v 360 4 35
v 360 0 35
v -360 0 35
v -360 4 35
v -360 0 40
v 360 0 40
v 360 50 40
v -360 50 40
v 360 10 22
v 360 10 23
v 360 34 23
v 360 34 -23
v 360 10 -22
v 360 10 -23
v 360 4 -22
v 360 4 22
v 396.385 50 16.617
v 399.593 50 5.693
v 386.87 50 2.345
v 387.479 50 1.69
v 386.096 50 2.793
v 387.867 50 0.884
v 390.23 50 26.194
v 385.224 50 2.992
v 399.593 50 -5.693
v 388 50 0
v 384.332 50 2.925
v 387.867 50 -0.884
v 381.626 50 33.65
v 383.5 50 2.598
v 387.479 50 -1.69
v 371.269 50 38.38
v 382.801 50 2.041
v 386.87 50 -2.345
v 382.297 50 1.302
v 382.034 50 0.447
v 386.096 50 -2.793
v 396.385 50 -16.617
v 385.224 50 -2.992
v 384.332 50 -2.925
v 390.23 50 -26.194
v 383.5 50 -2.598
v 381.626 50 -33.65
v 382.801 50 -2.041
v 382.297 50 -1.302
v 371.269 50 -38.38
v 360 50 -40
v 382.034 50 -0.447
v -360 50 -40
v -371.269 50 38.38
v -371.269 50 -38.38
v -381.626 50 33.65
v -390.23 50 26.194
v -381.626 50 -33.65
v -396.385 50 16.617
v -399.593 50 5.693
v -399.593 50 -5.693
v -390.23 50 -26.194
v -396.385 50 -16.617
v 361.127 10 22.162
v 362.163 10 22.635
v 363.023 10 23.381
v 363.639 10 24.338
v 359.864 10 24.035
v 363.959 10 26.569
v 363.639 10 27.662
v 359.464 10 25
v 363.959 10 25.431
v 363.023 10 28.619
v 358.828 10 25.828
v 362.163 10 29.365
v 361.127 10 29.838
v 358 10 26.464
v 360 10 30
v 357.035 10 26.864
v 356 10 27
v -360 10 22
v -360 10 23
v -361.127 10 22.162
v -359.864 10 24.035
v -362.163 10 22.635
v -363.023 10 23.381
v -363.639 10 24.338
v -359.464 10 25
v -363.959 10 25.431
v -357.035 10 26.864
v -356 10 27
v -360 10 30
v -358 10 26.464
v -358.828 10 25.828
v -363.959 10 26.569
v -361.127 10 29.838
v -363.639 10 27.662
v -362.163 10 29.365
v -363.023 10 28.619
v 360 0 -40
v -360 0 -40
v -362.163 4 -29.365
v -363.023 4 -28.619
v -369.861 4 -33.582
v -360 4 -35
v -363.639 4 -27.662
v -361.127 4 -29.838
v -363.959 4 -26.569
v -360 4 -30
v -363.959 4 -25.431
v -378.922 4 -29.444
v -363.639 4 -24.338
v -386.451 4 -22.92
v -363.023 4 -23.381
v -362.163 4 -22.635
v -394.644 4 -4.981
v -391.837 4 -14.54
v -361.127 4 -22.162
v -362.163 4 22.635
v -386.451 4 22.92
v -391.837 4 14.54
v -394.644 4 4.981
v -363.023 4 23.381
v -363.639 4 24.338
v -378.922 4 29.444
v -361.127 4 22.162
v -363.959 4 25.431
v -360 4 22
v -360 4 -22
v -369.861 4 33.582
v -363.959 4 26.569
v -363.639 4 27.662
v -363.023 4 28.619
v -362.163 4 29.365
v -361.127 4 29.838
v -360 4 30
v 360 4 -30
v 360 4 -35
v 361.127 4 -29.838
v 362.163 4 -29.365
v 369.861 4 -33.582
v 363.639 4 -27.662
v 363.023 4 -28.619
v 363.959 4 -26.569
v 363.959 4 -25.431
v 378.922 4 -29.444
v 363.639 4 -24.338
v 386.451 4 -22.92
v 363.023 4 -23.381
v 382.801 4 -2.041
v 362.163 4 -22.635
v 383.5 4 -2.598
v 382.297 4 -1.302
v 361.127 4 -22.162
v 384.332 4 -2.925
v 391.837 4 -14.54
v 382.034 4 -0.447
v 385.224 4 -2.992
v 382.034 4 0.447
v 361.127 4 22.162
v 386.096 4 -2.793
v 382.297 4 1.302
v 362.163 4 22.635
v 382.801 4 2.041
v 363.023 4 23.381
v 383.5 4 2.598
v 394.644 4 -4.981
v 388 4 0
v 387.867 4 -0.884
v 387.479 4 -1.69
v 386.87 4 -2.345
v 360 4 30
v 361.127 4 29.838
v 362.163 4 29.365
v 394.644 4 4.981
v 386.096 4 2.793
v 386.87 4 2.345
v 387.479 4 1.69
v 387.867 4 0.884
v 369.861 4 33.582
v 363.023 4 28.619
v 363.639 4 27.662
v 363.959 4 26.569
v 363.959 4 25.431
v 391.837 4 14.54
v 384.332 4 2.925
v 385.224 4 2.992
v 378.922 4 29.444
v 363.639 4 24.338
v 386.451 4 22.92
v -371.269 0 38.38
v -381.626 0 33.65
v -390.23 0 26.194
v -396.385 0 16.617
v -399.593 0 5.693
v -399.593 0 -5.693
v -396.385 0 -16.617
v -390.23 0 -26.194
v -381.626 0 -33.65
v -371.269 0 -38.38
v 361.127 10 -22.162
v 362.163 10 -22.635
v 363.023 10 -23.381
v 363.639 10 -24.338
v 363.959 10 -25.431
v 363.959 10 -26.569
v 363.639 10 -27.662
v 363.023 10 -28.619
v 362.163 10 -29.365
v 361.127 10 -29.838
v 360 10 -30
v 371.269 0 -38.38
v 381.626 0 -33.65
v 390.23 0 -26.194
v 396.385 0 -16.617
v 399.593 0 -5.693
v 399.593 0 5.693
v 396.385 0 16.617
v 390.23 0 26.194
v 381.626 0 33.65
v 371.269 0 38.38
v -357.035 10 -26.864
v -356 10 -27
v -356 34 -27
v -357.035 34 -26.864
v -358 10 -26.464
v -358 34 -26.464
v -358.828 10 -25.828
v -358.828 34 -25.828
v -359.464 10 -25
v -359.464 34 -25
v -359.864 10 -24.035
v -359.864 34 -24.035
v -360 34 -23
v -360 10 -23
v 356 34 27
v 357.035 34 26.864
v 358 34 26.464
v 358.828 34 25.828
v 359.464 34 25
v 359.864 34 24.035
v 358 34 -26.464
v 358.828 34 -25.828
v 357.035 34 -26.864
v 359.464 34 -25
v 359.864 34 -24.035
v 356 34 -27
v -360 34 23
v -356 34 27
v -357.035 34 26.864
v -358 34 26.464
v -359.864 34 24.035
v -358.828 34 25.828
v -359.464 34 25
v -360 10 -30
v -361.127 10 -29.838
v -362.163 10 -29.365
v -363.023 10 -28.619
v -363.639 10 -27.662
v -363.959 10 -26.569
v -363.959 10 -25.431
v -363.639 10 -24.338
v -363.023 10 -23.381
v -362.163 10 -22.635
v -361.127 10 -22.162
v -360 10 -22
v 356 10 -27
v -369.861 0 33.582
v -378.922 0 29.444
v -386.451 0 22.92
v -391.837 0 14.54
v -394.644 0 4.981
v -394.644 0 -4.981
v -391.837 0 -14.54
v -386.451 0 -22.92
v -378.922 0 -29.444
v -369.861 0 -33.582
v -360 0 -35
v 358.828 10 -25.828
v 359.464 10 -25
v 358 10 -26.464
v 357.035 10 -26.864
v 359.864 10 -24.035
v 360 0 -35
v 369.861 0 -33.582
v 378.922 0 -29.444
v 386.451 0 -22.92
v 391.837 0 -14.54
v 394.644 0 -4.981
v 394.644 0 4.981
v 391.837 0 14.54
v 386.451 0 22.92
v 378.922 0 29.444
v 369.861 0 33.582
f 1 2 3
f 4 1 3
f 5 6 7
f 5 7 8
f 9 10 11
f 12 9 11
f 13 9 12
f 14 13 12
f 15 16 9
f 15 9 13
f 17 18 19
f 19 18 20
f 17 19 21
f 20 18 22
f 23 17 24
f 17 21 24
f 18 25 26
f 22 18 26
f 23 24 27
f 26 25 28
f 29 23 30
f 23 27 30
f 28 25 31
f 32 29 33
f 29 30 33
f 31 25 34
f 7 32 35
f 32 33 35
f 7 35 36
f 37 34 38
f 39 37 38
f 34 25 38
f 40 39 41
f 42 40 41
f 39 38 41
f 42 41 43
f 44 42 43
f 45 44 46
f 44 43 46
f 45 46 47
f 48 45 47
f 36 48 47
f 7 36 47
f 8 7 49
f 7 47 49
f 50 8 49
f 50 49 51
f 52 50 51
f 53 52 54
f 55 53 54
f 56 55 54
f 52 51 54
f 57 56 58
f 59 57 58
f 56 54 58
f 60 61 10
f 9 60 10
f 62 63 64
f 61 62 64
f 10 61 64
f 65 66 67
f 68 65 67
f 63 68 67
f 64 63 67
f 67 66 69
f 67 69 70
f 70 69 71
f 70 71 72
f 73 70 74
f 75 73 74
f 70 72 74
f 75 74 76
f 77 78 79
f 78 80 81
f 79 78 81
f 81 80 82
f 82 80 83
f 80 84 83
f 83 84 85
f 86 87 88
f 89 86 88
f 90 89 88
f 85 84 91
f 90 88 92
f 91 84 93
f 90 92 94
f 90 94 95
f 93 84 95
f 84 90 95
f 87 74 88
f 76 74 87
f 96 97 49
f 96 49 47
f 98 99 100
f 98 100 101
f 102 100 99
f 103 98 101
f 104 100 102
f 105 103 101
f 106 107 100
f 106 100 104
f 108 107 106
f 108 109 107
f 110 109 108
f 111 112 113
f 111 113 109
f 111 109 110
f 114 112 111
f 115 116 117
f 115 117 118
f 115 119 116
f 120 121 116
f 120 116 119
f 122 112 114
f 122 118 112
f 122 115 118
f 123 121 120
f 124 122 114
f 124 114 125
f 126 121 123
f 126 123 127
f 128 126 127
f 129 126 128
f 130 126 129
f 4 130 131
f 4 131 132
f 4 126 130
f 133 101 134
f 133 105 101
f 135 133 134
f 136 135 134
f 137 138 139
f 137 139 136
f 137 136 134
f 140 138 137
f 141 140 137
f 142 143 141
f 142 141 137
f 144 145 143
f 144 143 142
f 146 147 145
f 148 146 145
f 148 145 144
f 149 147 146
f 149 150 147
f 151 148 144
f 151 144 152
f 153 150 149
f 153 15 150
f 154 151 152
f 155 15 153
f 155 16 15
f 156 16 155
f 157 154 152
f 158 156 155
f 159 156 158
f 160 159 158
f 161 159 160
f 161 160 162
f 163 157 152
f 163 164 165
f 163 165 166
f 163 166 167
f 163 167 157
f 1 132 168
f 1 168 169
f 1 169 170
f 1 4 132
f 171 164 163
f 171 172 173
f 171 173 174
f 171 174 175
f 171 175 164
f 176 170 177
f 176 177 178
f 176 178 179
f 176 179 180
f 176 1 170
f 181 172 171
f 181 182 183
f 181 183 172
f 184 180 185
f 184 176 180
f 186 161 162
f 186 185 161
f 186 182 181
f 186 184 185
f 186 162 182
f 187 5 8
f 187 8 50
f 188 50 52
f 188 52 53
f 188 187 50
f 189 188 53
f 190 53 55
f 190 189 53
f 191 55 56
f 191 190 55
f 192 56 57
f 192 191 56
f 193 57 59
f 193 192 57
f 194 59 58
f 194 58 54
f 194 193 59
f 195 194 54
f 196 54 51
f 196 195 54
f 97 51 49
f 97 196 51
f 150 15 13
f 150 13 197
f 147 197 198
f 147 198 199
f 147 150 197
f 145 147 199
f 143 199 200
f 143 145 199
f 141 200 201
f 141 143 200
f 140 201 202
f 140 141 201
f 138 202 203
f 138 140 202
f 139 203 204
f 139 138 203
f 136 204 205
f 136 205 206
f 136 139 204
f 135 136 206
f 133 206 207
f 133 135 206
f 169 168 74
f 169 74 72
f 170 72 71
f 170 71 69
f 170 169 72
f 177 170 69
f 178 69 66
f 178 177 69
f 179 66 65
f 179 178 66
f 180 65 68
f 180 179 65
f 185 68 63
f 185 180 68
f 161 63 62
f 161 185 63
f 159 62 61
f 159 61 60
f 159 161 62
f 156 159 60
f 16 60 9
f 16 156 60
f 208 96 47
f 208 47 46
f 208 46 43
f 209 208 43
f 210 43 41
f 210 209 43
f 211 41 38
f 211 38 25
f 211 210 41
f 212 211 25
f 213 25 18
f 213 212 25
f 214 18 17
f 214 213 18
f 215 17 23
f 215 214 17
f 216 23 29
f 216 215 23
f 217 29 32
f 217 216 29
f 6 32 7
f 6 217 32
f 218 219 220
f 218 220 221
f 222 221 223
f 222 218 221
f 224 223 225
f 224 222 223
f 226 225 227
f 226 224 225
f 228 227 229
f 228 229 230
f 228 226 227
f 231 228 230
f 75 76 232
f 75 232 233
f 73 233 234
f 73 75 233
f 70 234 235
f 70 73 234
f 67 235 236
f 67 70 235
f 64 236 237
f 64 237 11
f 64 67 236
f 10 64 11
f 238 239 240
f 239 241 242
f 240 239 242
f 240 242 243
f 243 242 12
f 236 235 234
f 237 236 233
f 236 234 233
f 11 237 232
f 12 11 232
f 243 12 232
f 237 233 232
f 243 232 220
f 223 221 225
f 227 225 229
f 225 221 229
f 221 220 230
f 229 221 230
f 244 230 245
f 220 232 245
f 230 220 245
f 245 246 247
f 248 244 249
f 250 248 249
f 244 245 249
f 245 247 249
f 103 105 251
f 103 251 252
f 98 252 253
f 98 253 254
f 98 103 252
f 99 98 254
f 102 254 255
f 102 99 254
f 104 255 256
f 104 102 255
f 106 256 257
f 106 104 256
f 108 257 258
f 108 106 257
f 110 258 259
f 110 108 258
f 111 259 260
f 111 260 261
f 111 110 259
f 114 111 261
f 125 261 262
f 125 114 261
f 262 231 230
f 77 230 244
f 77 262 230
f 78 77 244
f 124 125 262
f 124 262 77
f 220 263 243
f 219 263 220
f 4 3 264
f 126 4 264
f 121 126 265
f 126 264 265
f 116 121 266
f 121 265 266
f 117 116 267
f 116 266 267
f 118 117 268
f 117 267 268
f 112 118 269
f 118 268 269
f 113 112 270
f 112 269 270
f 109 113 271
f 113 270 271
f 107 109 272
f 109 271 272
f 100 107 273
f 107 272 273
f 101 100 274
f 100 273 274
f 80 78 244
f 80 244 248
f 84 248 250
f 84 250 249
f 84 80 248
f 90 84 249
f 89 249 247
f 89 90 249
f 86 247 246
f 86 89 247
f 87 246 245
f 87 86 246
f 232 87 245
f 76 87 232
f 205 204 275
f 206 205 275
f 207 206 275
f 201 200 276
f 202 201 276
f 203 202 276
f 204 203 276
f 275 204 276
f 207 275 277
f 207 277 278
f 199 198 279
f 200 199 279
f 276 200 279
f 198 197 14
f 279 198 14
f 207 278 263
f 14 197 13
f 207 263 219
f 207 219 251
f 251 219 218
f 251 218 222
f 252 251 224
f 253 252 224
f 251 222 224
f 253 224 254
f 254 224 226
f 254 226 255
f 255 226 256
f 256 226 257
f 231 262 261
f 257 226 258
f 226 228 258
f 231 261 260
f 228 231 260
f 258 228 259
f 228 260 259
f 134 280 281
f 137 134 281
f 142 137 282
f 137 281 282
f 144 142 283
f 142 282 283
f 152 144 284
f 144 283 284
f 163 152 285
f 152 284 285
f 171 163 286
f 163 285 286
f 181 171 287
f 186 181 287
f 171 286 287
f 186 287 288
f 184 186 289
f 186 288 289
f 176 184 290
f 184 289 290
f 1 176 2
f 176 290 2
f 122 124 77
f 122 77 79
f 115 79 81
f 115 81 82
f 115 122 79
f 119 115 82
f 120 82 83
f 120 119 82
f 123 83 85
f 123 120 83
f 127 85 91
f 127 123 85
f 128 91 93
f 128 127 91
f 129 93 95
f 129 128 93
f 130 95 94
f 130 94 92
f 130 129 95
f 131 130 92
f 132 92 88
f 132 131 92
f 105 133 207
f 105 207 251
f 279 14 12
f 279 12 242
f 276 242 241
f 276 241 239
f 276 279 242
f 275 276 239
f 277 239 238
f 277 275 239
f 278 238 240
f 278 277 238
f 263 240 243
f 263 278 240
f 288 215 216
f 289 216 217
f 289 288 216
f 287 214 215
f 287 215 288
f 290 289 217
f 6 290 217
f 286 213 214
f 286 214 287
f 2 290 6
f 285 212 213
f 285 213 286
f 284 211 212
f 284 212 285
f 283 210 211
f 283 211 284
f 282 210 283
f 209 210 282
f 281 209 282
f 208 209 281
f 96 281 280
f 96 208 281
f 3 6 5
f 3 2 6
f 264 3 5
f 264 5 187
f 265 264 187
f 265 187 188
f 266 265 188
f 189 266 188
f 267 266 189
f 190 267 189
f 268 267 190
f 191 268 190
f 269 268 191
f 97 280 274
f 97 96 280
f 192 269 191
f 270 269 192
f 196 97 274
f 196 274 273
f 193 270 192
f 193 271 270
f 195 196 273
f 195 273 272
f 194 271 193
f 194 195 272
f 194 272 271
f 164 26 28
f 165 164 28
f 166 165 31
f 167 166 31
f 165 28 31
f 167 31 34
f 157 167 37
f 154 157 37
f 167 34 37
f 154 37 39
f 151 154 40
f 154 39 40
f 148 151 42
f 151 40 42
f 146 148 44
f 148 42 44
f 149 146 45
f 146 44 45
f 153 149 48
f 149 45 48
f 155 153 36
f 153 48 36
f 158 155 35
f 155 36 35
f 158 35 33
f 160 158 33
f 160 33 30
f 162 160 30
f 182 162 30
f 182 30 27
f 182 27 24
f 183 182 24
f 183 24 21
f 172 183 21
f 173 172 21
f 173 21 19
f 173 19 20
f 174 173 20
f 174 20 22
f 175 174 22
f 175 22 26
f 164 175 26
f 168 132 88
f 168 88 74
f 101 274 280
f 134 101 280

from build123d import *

# Parameters (mm, degrees)
BOSS_EXTRUDE1_DEPTH = 50
CUT_EXTRUDE2_DEPTH  = 4
CUT_EXTRUDE14_DEPTH = 6
CUT_EXTRUDE16_DEPTH = 30
HOLE1_D             = 6


with BuildPart() as part:
    # Sketch1 → Boss-Extrude1 (new body)
    with BuildSketch(Plane(origin=(0, 0, 0), x_dir=(1, 0, 0), z_dir=(0, 1, 0))):
        with BuildLine():
            Line((-360, 39.99999406), (360, 39.99999406))
            ThreePointArc((360, 39.99999406), (399.999998105, -4.045e-06), (360, -40))
            Line((360, -40), (-360, -40))
            ThreePointArc((-360, -40), (-399.99999406, -5.94e-06), (-360, 39.99999406))
        make_face()
    extrude(amount=BOSS_EXTRUDE1_DEPTH)

    # Sketch4 → Cut-Extrude2 (cut)
    with BuildSketch(Plane.XZ):
        with BuildLine():
            Line((360, 35.000001075), (-360, 35.000001485))
            ThreePointArc((-360, 35.000001485), (-394.999995545, 5.94e-06), (-360, -34.999989605))
            Line((-360, -34.999989605), (360.000000021, -34.99999406))
            ThreePointArc((360.000000021, -34.99999406), (394.999998105, 4.055e-06), (360, 35.000001075))
        make_face()
    extrude(amount=-CUT_EXTRUDE2_DEPTH, mode=Mode.SUBTRACT)

    # Sketch15 → Cut-Extrude14 (cut)
    with BuildSketch(Plane.XZ.offset(-4)):
        with BuildLine():
            Line((360, -30), (-360, -30))
            ThreePointArc((-360, -30), (-364, -26), (-360, -22))
            Line((-360, -22), (-360, 22))
            ThreePointArc((-360, 22), (-364, 26), (-360, 30))
            Line((-360, 30), (360, 30))
            ThreePointArc((360, 30), (364, 26), (360, 22))
            Line((360, 22), (360, -22))
            ThreePointArc((360, -22), (364, -26), (360, -30))
        make_face()
    extrude(amount=-CUT_EXTRUDE14_DEPTH, mode=Mode.SUBTRACT)

    # Sketch2 → Cut-Extrude16 (cut)
    with BuildSketch(Plane.XZ.offset(-4)):
        with BuildLine():
            Line((356, -26.99999406), (-356, -26.99999406))
            ThreePointArc((-356, -26.99999406), (-358.828427125, -25.828421185), (-360, -22.99999406))
            Line((-360, -22.99999406), (-360, 23))
            ThreePointArc((-360, 23), (-358.828427125, 25.828427125), (-356, 27))
            Line((-356, 27), (356, 27))
            ThreePointArc((356, 27), (358.828427125, 25.828427125), (360, 23))
            Line((360, 23), (360, -22.99999406))
            ThreePointArc((360, -22.99999406), (358.828427125, -25.828421185), (356, -26.99999406))
        make_face()
    extrude(amount=-CUT_EXTRUDE16_DEPTH, mode=Mode.SUBTRACT)

    # Hole1 (through all)
    with Locations(Plane(origin=(0, 4, 0), x_dir=(-1, 0, 0), z_dir=(0, -1, 0))):
        with Locations((-385, 0)):
            Hole(HOLE1_D / 2)


solid = part.part
